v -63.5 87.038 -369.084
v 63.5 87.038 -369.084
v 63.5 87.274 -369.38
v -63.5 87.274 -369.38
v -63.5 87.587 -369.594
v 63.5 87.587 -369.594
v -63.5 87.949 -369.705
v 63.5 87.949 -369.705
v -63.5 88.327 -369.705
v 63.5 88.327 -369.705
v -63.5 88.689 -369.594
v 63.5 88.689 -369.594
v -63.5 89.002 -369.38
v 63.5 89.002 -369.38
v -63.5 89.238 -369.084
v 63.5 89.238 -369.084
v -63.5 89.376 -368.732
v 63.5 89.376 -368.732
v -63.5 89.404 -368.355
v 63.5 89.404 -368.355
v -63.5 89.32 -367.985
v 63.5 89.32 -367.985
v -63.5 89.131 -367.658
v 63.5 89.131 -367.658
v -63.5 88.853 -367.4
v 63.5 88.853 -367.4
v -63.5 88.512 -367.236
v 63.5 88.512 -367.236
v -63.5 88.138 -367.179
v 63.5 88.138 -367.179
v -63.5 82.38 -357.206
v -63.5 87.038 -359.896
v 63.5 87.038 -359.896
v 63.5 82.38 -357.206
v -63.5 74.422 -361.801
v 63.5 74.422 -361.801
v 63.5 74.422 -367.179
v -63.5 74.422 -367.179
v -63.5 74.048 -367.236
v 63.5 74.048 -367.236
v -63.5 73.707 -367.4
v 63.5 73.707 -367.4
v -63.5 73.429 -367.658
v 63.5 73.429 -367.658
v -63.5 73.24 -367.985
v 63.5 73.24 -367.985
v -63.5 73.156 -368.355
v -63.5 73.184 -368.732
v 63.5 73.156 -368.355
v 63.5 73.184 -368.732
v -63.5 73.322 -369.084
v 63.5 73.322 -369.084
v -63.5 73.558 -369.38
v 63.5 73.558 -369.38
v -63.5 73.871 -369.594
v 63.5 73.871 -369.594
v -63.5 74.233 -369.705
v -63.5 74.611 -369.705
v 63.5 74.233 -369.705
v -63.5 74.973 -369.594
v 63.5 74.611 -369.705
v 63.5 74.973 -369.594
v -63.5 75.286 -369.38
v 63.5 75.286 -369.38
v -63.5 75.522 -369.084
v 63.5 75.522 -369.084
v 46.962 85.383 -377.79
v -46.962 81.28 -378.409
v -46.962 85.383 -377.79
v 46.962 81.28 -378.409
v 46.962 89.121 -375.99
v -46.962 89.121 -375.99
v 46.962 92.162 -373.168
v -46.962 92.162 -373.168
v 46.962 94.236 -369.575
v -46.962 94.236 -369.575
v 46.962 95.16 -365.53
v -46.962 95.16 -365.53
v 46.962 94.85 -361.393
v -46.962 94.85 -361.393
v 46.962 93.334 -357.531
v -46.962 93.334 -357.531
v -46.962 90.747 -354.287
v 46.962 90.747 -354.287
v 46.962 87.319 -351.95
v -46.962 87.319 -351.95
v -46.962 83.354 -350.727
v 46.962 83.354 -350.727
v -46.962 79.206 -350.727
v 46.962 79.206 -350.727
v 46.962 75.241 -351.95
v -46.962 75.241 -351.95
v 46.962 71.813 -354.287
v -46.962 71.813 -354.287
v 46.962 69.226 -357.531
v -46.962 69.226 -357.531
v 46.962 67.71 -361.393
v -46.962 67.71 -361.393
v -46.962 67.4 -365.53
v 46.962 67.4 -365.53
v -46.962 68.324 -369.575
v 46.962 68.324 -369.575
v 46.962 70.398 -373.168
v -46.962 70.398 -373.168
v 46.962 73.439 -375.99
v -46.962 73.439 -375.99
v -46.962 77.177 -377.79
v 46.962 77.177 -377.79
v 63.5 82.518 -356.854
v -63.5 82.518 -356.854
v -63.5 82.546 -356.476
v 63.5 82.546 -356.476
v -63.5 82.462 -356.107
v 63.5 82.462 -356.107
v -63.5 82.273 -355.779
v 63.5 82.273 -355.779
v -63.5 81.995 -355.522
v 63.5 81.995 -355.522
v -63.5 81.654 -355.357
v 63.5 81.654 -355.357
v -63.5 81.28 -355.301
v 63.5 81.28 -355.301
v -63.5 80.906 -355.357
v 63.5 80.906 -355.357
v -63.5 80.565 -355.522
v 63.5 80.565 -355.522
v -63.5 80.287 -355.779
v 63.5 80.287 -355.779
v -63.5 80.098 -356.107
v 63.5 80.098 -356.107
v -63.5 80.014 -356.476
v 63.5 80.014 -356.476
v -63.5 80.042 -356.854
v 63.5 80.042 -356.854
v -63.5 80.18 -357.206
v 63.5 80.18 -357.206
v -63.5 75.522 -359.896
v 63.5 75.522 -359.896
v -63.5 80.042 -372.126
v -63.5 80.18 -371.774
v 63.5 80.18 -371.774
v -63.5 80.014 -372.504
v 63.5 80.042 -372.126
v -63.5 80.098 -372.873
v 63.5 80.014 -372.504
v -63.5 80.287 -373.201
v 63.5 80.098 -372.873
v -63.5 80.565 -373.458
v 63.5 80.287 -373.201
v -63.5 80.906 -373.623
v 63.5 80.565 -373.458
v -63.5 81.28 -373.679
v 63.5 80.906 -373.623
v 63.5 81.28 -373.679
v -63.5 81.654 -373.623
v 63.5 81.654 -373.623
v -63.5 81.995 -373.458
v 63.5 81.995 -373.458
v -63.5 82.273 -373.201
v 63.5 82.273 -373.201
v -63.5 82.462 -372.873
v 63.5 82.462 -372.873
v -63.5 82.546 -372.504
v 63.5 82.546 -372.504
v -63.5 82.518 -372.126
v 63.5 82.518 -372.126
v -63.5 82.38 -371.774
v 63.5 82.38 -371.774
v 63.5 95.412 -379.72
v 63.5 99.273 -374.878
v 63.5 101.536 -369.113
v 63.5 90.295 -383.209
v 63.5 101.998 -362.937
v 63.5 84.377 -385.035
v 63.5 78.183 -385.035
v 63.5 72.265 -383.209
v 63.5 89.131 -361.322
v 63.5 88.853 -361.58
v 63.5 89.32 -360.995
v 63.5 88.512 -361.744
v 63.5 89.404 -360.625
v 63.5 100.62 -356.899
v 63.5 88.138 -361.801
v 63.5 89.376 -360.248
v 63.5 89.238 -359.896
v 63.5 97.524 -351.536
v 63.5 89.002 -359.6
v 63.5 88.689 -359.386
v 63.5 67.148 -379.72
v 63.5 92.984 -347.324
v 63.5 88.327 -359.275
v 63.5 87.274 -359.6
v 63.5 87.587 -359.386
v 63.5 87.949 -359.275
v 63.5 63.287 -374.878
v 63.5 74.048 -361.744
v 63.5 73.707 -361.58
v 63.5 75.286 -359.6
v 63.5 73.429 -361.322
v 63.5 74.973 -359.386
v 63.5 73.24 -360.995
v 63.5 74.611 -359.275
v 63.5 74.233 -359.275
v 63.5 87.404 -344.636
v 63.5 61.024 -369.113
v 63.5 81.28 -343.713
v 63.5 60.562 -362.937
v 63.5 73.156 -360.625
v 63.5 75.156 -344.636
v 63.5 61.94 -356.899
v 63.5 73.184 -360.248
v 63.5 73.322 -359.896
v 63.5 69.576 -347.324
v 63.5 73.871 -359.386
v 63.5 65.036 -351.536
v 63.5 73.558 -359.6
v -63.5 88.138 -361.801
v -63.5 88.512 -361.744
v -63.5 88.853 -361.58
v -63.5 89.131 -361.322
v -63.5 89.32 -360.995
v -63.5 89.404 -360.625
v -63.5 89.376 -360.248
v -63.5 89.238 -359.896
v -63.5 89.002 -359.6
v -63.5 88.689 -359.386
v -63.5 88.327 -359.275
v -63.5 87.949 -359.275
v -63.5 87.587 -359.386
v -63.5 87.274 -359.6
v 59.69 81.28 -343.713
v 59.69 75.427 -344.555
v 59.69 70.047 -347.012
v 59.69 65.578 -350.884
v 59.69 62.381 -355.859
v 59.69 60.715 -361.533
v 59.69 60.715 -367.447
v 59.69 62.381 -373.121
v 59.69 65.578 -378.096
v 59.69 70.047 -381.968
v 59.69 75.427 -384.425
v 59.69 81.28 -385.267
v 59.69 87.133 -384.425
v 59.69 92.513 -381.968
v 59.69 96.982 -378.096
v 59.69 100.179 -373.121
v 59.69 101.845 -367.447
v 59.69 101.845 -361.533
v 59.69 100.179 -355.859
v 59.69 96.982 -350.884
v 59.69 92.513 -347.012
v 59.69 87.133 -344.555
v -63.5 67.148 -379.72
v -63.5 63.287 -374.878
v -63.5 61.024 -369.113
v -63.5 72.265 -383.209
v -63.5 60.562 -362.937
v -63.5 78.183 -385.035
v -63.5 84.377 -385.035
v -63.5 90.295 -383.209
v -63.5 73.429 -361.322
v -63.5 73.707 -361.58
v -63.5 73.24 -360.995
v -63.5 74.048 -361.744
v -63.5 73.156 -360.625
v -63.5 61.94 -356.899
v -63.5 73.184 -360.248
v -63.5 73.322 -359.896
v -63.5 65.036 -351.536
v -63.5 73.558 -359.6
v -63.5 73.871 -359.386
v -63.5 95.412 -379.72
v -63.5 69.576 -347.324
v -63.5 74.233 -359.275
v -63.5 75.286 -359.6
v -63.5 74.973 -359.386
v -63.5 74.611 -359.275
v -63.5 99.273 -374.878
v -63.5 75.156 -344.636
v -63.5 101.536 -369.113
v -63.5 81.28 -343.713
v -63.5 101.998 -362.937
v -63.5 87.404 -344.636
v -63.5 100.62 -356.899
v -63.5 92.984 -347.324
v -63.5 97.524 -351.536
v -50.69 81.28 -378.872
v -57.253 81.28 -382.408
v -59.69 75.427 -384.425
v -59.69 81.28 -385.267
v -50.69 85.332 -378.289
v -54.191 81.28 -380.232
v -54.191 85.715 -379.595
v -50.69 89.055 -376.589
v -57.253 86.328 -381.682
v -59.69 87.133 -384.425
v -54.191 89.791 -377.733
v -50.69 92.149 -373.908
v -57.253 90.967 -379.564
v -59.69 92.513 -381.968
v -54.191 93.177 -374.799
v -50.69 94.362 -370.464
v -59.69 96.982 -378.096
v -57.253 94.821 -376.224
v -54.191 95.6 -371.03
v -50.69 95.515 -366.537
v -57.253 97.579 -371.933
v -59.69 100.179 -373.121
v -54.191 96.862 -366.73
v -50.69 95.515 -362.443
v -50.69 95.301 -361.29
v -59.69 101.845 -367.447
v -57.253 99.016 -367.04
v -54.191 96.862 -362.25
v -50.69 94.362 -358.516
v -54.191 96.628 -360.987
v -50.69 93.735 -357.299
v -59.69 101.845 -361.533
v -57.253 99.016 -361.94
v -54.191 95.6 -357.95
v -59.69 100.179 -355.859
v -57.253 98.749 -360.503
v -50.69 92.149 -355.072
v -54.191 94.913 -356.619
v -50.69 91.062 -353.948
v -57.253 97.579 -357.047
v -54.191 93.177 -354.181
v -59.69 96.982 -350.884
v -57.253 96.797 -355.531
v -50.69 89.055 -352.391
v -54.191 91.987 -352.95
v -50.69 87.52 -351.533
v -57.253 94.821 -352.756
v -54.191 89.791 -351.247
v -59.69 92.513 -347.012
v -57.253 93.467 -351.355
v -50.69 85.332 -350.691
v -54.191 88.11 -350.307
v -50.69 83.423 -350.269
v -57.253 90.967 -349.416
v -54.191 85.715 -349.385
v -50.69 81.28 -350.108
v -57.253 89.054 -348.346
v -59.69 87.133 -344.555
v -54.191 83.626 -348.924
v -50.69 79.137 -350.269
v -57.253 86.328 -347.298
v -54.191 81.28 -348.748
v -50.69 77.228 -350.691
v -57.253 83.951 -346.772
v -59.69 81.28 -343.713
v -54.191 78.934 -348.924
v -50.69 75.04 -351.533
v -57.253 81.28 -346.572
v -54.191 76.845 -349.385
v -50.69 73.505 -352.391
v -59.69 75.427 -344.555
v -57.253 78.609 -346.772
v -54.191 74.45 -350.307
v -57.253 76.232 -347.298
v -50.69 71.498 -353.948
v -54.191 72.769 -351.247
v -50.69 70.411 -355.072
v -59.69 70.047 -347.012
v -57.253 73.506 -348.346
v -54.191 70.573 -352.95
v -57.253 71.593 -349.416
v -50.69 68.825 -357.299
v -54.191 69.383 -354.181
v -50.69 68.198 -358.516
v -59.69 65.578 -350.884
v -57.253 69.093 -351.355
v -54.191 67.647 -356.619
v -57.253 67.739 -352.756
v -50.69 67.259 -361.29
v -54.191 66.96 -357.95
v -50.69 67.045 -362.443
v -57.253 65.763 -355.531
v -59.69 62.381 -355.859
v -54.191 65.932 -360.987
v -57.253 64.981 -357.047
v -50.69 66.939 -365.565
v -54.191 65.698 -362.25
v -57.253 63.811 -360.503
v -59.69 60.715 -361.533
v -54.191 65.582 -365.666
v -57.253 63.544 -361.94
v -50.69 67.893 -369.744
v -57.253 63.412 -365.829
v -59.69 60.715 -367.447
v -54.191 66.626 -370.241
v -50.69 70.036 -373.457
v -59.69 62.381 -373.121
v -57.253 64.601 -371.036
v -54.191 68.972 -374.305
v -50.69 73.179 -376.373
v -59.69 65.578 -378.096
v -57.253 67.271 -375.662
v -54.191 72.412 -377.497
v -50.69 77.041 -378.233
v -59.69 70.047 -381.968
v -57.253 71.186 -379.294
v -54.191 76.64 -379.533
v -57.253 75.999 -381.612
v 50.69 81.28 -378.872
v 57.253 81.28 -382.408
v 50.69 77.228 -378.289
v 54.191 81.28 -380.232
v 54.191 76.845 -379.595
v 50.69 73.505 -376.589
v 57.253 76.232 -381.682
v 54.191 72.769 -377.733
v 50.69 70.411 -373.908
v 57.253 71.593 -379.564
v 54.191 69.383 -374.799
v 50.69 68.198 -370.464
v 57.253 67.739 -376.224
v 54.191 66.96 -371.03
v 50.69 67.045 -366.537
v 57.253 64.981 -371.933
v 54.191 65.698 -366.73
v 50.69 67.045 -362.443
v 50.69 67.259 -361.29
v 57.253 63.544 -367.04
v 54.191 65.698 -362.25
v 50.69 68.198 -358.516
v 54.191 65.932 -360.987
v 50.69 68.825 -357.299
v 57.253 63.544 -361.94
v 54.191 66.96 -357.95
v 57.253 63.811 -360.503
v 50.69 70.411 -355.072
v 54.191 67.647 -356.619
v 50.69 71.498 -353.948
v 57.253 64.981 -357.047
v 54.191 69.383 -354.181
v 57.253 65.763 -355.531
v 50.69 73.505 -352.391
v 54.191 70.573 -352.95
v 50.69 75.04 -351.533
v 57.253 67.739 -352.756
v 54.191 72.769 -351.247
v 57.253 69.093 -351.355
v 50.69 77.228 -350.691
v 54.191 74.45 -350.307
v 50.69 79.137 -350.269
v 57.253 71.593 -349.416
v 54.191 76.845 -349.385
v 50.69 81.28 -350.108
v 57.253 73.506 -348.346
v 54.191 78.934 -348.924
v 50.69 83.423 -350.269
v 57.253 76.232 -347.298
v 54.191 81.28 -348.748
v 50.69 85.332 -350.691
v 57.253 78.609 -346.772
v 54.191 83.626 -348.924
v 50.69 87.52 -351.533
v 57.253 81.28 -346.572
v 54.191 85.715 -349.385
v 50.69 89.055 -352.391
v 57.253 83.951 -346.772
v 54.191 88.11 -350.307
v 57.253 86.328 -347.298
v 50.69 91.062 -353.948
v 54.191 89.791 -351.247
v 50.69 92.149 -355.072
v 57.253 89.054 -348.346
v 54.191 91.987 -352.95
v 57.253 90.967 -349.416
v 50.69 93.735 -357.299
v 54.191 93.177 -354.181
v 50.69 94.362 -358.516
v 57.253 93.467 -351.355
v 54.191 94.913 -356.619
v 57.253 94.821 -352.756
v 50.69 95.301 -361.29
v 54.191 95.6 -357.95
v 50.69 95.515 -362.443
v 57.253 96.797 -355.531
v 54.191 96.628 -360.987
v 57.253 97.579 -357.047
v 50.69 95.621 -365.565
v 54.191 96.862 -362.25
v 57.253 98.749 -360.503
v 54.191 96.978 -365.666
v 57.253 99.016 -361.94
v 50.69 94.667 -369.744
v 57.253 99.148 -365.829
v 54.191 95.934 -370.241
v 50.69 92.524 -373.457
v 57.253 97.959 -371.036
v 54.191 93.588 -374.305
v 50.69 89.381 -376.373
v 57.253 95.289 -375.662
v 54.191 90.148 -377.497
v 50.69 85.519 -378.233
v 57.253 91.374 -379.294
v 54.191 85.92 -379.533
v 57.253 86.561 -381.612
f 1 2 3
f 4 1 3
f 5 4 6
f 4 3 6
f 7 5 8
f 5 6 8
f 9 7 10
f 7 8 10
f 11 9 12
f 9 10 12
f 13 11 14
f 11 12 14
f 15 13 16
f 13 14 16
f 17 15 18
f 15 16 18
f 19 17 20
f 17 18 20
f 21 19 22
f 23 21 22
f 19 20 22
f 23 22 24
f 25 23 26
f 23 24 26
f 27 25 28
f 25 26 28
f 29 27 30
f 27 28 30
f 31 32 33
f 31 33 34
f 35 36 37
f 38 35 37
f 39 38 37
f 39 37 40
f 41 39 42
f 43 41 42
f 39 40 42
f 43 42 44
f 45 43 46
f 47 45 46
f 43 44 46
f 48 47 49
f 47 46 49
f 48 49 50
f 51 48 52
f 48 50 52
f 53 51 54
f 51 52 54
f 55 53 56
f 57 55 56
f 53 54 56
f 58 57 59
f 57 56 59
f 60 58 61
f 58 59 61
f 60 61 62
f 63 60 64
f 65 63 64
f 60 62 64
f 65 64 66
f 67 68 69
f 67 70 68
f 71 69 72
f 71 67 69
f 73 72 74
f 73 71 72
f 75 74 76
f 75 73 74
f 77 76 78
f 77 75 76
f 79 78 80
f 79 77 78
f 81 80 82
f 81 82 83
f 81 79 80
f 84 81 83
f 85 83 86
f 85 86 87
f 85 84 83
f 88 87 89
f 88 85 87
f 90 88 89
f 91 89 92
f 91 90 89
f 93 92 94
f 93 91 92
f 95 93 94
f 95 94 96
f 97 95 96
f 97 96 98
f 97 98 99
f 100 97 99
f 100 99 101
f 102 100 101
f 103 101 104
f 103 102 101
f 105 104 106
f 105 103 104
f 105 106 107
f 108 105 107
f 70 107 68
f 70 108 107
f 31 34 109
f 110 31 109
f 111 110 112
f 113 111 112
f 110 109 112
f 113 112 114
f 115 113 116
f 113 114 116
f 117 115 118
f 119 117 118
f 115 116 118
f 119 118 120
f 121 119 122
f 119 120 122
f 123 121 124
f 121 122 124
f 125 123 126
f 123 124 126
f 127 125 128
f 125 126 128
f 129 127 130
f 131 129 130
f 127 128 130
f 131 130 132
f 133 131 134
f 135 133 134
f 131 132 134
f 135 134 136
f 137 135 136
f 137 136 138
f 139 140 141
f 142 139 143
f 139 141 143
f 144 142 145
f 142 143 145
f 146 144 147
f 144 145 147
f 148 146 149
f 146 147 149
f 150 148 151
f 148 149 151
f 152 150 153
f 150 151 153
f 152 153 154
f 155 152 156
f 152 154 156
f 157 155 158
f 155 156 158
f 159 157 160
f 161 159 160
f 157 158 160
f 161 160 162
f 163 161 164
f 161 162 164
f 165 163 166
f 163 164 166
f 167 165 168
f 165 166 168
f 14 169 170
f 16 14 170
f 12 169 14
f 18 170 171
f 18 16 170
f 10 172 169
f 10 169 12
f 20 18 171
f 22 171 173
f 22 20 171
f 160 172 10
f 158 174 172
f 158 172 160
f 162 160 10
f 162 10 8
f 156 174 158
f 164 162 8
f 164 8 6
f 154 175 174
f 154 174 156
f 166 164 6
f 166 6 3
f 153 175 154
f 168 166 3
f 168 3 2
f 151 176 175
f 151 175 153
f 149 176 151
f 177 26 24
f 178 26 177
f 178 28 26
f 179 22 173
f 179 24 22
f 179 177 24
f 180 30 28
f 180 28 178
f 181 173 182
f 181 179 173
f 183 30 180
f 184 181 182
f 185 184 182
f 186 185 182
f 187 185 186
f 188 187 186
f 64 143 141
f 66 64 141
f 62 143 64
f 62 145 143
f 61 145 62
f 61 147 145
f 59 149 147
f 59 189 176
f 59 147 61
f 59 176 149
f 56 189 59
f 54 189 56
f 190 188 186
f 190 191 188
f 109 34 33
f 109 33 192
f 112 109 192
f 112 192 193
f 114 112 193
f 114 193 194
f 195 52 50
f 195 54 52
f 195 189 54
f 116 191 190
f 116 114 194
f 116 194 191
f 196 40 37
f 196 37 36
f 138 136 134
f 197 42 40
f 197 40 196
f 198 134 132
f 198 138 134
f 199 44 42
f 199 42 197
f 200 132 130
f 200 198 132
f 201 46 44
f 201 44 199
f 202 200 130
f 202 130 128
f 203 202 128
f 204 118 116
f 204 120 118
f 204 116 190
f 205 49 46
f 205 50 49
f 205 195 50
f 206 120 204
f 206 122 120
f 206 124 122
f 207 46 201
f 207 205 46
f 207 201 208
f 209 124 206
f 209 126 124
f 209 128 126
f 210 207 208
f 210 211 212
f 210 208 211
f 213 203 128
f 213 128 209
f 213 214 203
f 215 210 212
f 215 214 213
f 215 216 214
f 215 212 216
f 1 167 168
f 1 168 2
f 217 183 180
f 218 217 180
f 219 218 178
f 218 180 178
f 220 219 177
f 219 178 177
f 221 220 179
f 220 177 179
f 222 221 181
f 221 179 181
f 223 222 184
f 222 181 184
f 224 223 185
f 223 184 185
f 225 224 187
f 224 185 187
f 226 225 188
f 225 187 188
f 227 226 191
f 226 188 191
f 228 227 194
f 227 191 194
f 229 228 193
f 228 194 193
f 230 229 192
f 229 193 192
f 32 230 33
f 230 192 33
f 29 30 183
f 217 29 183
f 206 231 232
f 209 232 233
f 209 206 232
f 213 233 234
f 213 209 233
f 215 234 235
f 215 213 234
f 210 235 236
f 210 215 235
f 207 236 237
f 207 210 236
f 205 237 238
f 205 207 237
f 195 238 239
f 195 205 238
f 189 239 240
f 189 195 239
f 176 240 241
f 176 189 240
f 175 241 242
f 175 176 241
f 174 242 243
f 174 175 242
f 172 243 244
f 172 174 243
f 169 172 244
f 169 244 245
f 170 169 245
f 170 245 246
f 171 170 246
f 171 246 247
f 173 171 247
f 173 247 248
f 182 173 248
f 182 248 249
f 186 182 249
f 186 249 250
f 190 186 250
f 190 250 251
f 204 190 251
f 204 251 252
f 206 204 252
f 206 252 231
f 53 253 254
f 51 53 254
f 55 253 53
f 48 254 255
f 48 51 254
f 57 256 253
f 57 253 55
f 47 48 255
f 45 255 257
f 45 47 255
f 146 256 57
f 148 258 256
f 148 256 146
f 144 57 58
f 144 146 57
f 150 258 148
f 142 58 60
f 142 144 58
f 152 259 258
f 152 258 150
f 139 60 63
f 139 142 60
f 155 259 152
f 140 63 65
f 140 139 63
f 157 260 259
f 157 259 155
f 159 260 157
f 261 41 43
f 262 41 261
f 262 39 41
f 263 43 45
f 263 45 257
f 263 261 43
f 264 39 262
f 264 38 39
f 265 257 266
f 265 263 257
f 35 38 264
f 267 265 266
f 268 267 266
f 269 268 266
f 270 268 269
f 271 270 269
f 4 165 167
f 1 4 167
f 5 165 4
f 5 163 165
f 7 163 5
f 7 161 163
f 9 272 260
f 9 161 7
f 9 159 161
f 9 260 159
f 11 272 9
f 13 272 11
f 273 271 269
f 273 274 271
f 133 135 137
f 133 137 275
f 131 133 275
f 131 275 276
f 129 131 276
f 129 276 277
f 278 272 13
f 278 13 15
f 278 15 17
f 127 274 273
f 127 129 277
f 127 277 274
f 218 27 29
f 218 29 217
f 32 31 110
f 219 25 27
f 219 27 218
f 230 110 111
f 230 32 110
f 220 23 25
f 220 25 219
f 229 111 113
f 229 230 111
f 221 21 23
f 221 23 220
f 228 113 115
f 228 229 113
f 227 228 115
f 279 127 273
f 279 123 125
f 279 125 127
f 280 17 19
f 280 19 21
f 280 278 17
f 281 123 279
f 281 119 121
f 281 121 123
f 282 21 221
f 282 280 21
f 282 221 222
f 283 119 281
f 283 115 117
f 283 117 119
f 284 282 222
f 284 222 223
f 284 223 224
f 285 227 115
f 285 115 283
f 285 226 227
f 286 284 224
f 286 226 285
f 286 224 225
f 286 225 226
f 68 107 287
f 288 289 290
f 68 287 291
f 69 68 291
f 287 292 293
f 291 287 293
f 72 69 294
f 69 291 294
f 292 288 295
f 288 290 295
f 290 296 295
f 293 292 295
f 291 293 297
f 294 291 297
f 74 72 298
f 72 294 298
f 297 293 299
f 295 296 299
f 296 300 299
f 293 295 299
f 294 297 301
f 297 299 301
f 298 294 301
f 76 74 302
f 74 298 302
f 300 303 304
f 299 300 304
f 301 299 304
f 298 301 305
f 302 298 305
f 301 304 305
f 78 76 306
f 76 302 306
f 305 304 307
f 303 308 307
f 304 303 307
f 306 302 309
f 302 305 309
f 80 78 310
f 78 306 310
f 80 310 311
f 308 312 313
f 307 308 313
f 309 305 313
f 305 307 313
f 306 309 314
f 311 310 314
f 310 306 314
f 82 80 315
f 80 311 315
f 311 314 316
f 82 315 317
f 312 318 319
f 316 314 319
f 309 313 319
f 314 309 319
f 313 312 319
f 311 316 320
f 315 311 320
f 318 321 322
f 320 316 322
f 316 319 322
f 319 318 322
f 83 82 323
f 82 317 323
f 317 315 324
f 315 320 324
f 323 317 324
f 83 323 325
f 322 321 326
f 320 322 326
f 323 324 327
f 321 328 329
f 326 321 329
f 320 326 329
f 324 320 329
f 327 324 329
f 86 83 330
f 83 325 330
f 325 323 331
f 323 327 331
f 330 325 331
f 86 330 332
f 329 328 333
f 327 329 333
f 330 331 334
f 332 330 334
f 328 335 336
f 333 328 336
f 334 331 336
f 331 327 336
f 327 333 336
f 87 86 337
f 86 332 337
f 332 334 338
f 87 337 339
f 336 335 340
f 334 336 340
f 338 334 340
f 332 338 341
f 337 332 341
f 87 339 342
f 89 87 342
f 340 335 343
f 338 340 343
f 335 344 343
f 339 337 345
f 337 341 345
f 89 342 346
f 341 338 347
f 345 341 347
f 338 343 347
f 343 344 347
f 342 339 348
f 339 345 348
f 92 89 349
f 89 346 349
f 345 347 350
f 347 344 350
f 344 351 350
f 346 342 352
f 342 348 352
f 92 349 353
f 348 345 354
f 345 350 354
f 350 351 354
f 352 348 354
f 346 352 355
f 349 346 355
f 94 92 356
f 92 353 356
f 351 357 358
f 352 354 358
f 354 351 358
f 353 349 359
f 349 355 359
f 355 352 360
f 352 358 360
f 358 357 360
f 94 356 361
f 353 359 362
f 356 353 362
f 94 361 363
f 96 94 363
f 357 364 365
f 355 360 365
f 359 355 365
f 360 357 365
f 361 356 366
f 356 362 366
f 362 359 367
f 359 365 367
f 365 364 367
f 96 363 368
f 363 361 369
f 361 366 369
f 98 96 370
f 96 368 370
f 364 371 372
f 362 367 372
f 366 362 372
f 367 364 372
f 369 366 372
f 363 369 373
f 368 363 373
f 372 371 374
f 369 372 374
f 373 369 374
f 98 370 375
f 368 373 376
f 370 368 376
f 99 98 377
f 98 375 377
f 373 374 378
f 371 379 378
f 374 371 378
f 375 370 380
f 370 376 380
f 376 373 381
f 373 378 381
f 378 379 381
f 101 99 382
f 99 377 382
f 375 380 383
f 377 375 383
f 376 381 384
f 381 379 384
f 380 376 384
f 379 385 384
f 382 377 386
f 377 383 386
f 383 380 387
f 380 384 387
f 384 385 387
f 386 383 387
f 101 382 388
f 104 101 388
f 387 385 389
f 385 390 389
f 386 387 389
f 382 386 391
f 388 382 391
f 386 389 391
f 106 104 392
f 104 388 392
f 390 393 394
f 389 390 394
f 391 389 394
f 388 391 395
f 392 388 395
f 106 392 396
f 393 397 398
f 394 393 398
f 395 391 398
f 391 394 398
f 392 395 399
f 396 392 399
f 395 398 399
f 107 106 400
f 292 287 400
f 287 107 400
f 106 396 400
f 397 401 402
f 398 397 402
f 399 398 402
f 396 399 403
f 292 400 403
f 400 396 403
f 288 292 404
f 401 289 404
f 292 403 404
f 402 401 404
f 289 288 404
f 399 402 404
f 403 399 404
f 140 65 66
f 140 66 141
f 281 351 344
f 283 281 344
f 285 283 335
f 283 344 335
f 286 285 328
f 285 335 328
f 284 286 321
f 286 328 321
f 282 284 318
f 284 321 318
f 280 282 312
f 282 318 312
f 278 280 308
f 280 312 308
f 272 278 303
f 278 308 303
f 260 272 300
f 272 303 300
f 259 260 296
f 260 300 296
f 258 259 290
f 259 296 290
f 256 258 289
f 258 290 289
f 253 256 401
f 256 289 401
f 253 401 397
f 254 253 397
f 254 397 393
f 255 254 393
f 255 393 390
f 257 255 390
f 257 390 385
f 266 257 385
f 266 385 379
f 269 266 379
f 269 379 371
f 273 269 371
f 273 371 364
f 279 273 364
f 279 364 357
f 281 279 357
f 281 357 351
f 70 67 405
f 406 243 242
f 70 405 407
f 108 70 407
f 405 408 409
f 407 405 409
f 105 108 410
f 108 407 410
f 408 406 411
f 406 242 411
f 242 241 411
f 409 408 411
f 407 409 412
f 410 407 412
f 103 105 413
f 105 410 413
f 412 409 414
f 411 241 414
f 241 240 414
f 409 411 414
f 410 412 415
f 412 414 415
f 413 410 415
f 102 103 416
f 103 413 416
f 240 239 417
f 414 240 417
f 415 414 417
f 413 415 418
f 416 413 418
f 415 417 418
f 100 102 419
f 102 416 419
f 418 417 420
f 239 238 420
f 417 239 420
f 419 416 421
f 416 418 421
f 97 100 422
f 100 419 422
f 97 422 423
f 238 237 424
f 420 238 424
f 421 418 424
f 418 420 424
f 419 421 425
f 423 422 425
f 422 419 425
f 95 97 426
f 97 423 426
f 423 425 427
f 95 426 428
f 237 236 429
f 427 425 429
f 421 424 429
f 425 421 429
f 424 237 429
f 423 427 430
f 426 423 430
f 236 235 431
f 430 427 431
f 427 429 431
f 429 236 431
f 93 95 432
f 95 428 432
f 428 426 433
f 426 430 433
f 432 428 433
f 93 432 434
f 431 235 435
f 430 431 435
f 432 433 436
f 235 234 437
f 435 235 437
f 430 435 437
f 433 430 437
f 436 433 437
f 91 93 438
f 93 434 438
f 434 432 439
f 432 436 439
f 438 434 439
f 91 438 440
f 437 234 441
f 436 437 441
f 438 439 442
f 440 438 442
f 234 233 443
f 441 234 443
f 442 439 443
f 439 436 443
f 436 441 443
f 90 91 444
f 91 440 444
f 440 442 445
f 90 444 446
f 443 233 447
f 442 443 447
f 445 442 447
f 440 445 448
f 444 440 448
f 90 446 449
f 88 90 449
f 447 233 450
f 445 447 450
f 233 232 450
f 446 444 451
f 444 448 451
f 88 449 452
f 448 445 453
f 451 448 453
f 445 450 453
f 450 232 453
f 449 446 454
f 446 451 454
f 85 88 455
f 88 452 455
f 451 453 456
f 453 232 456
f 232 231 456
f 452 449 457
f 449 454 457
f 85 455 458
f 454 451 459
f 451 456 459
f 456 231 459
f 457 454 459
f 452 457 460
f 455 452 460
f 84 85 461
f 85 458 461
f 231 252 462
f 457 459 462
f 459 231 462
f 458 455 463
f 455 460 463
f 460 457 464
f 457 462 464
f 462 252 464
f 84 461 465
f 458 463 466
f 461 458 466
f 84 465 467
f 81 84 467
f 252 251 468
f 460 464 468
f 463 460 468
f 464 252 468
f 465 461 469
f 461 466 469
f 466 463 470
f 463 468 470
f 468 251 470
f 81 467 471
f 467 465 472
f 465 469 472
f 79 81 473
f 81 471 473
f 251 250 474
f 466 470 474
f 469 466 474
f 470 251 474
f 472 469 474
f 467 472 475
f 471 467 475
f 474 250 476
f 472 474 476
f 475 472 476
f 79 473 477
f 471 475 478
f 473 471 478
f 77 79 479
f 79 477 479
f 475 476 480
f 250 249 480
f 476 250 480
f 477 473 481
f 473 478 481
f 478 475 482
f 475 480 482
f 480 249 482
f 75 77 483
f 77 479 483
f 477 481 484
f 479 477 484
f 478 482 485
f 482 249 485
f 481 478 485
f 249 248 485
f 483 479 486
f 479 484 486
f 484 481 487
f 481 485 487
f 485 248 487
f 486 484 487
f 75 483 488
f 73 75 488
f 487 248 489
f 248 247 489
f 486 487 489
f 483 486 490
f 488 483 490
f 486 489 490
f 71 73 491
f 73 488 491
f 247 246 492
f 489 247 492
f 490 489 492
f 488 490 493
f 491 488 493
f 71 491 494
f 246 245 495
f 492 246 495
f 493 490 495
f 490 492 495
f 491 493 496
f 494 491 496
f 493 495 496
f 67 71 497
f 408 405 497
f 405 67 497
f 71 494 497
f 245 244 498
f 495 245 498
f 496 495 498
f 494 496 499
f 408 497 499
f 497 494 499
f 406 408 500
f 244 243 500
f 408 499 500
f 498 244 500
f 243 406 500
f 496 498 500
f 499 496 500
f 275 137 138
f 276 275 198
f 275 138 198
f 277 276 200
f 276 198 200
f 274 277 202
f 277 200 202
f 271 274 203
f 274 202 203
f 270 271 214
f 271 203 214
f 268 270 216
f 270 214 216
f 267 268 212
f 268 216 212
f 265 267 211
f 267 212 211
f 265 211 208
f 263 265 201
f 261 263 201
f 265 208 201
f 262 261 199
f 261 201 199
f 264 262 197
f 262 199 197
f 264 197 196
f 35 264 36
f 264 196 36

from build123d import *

# Parameters (mm, degrees)
SKETCH1_R           = 13.918584035
BOSS_EXTRUDE1_DEPTH = 63.5
BOSS_EXTRUDE2_START = -3.81
SKETCH3_R           = 20.776584035
SKETCH3_R_2         = 13.918584035
BOSS_EXTRUDE2_DEPTH = 3.81
FILLET1_R           = 15.24
SKETCH4_R           = 20.776584035
SKETCH4_R_2         = 13.918584035
BOSS_EXTRUDE3_DEPTH = 3.81
FILLET2_R           = 15.24
SKETCH7_R           = 1.27
CUT_EXTRUDE1_DEPTH  = 419.299996556


with BuildPart() as part:
    # Sketch1 → Boss-Extrude1 (new, symmetric)
    with BuildSketch(Plane(origin=(0, 0, 0), x_dir=(0, 0, -1), z_dir=(1, 0, 0))):
        with Locations((364.49, 81.28)):
            Circle(SKETCH1_R)
    extrude(amount=BOSS_EXTRUDE1_DEPTH, both=True)

    # Sketch3 → Boss-Extrude2 (add)
    with BuildSketch(Plane.ZY.offset(63.5).offset(BOSS_EXTRUDE2_START)):
        with Locations((-364.49, 81.28)):
            Circle(SKETCH3_R)
        with Locations((-364.49, 81.28)):
            Circle(SKETCH3_R_2, mode=Mode.SUBTRACT)
    extrude(amount=BOSS_EXTRUDE2_DEPTH)

    # Fillet1
    # the kernel refuses this fillet: 15.24 mm, written as the material it adds along each edge
    with BuildSketch(Plane(origin=(-59.69, 81.28, -364.49), x_dir=(0, 0, -1), z_dir=(0, -1, 0))) as fillet1_piece_1:
        with BuildLine():
            CenterArc((29.158584035, 12.727909333), FILLET1_R, 180, 56.632987031)
            Line((20.776584035, 0), (20.608944035, -0.254558187))
            ThreePointArc((20.608944035, -0.254558187), (17.347584035, -0.3048), (13.918584035, -0.3048))
            Line((13.918584035, -0.3048), (13.613784035, 0))
            Line((13.613784035, 0), (13.613784035, 12.727909333))
            Line((13.613784035, 12.727909333), (13.918584035, 12.727909333))
        make_face()
    revolve(axis=Axis((-59.69, 81.28, -364.49), (1, 0, 0)))

    # Sketch4 → Boss-Extrude3 (add)
    with BuildSketch(Plane(origin=(63.5, 0, 0), x_dir=(0, 0, -1), z_dir=(1, 0, 0))):
        with Locations(Location((364.49, 81.28, 0), (0, 0, 180))):
            Circle(SKETCH4_R)
        with Locations(Location((364.49, 81.28, 0), (0, 0, 180))):
            Circle(SKETCH4_R_2, mode=Mode.SUBTRACT)
    extrude(amount=-BOSS_EXTRUDE3_DEPTH)

    # Fillet2
    # the kernel refuses this fillet: 15.24 mm, written as the material it adds along each edge
    with BuildSketch(Plane(origin=(59.69, 81.28, -364.49), x_dir=(0, 0, -1), z_dir=(0, 1, 0))) as fillet2_piece_1:
        with BuildLine():
            CenterArc((29.158584035, 12.727909333), FILLET2_R, 180, 56.632987031)
            Line((20.776584035, 0), (20.608944035, -0.254558187))
            ThreePointArc((20.608944035, -0.254558187), (17.347584035, -0.3048), (13.918584035, -0.3048))
            Line((13.918584035, -0.3048), (13.613784035, 0))
            Line((13.613784035, 0), (13.613784035, 12.727909333))
            Line((13.613784035, 12.727909333), (13.918584035, 12.727909333))
        make_face()
    revolve(axis=Axis((59.69, 81.28, -364.49), (-1, 0, 0)))

    # Sketch7 → Cut-Extrude1 (cut, through all)
    with BuildSketch(Plane(origin=(63.5, 0, 0), x_dir=(0, 0, -1), z_dir=(1, 0, 0))):
        with Locations((372.408936292, 81.28)):
            Circle(SKETCH7_R)
        with Locations((368.449468146, 88.138)):
            Circle(SKETCH7_R)
        with Locations((360.530531854, 88.138)):
            Circle(SKETCH7_R)
        with Locations((356.571063708, 81.28)):
            Circle(SKETCH7_R)
        with Locations((360.530531854, 74.422)):
            Circle(SKETCH7_R)
        with Locations((368.449468146, 74.422)):
            Circle(SKETCH7_R)
        Polygon((372.408936292, 81.28), (368.449468146, 88.138), (360.530531854, 88.138), (356.571063708, 81.28), (360.530531854, 74.422), (368.449468146, 74.422), align=None)
        with BuildLine():
            ThreePointArc((359.895531854, 87.038147737), (361.165531854, 87.038147737), (361.800531854, 88.138))
            Line((361.800531854, 88.138), (360.530531854, 88.138))
            Line((360.530531854, 88.138), (359.895531854, 87.038147737))
        make_face()
        with BuildLine():
            Line((360.530531854, 88.138), (361.800531854, 88.138))
            ThreePointArc((361.800531854, 88.138), (359.895531854, 89.237852263), (359.895531854, 87.038147737))
            Line((359.895531854, 87.038147737), (360.530531854, 88.138))
        make_face()
        with BuildLine():
            ThreePointArc((357.841063708, 81.28), (357.670915971, 81.915), (357.206063708, 82.379852263))
            Line((357.206063708, 82.379852263), (356.571063708, 81.28))
            Line((356.571063708, 81.28), (357.206063708, 80.180147737))
            ThreePointArc((357.206063708, 80.180147737), (357.670915971, 80.645), (357.841063708, 81.28))
        make_face()
        with BuildLine():
            Line((356.571063708, 81.28), (357.206063708, 82.379852263))
            ThreePointArc((357.206063708, 82.379852263), (355.301063708, 81.28), (357.206063708, 80.180147737))
            Line((357.206063708, 80.180147737), (356.571063708, 81.28))
        make_face()
        with BuildLine():
            ThreePointArc((359.895531854, 75.521852263), (359.895531854, 73.322147737), (361.800531854, 74.422))
            Line((361.800531854, 74.422), (360.530531854, 74.422))
            Line((360.530531854, 74.422), (359.895531854, 75.521852263))
        make_face()
        with BuildLine():
            Line((360.530531854, 74.422), (361.800531854, 74.422))
            ThreePointArc((361.800531854, 74.422), (361.165531854, 75.521852263), (359.895531854, 75.521852263))
            Line((359.895531854, 75.521852263), (360.530531854, 74.422))
        make_face()
        with BuildLine():
            ThreePointArc((367.179468146, 88.138), (367.814468146, 87.038147737), (369.084468146, 87.038147737))
            Line((369.084468146, 87.038147737), (368.449468146, 88.138))
            Line((368.449468146, 88.138), (367.179468146, 88.138))
        make_face()
        with BuildLine():
            Line((368.449468146, 88.138), (369.084468146, 87.038147737))
            ThreePointArc((369.084468146, 87.038147737), (369.549320409, 87.503), (369.719468146, 88.138))
            ThreePointArc((369.719468146, 88.138), (368.449468146, 89.408), (367.179468146, 88.138))
            Line((367.179468146, 88.138), (368.449468146, 88.138))
        make_face()
        with BuildLine():
            Line((371.773936292, 80.180147737), (372.408936292, 81.28))
            Line((372.408936292, 81.28), (371.773936292, 82.379852263))
            ThreePointArc((371.773936292, 82.379852263), (371.138936292, 81.28), (371.773936292, 80.180147737))
        make_face()
        with BuildLine():
            Line((371.773936292, 82.379852263), (372.408936292, 81.28))
            Line((372.408936292, 81.28), (371.773936292, 80.180147737))
            ThreePointArc((371.773936292, 80.180147737), (373.043936292, 80.180147737), (373.678936292, 81.28))
            ThreePointArc((373.678936292, 81.28), (373.043936292, 82.379852263), (371.773936292, 82.379852263))
        make_face()
        with BuildLine():
            ThreePointArc((369.719468146, 74.422), (369.549320409, 75.057), (369.084468146, 75.521852263))
            Line((369.084468146, 75.521852263), (368.449468146, 74.422))
            Line((368.449468146, 74.422), (367.179468146, 74.422))
            ThreePointArc((367.179468146, 74.422), (368.449468146, 73.152), (369.719468146, 74.422))
        make_face()
        with BuildLine():
            Line((368.449468146, 74.422), (369.084468146, 75.521852263))
            ThreePointArc((369.084468146, 75.521852263), (367.814468146, 75.521852263), (367.179468146, 74.422))
            Line((367.179468146, 74.422), (368.449468146, 74.422))
        make_face()
    extrude(amount=-CUT_EXTRUDE1_DEPTH, mode=Mode.SUBTRACT)


solid = part.part
